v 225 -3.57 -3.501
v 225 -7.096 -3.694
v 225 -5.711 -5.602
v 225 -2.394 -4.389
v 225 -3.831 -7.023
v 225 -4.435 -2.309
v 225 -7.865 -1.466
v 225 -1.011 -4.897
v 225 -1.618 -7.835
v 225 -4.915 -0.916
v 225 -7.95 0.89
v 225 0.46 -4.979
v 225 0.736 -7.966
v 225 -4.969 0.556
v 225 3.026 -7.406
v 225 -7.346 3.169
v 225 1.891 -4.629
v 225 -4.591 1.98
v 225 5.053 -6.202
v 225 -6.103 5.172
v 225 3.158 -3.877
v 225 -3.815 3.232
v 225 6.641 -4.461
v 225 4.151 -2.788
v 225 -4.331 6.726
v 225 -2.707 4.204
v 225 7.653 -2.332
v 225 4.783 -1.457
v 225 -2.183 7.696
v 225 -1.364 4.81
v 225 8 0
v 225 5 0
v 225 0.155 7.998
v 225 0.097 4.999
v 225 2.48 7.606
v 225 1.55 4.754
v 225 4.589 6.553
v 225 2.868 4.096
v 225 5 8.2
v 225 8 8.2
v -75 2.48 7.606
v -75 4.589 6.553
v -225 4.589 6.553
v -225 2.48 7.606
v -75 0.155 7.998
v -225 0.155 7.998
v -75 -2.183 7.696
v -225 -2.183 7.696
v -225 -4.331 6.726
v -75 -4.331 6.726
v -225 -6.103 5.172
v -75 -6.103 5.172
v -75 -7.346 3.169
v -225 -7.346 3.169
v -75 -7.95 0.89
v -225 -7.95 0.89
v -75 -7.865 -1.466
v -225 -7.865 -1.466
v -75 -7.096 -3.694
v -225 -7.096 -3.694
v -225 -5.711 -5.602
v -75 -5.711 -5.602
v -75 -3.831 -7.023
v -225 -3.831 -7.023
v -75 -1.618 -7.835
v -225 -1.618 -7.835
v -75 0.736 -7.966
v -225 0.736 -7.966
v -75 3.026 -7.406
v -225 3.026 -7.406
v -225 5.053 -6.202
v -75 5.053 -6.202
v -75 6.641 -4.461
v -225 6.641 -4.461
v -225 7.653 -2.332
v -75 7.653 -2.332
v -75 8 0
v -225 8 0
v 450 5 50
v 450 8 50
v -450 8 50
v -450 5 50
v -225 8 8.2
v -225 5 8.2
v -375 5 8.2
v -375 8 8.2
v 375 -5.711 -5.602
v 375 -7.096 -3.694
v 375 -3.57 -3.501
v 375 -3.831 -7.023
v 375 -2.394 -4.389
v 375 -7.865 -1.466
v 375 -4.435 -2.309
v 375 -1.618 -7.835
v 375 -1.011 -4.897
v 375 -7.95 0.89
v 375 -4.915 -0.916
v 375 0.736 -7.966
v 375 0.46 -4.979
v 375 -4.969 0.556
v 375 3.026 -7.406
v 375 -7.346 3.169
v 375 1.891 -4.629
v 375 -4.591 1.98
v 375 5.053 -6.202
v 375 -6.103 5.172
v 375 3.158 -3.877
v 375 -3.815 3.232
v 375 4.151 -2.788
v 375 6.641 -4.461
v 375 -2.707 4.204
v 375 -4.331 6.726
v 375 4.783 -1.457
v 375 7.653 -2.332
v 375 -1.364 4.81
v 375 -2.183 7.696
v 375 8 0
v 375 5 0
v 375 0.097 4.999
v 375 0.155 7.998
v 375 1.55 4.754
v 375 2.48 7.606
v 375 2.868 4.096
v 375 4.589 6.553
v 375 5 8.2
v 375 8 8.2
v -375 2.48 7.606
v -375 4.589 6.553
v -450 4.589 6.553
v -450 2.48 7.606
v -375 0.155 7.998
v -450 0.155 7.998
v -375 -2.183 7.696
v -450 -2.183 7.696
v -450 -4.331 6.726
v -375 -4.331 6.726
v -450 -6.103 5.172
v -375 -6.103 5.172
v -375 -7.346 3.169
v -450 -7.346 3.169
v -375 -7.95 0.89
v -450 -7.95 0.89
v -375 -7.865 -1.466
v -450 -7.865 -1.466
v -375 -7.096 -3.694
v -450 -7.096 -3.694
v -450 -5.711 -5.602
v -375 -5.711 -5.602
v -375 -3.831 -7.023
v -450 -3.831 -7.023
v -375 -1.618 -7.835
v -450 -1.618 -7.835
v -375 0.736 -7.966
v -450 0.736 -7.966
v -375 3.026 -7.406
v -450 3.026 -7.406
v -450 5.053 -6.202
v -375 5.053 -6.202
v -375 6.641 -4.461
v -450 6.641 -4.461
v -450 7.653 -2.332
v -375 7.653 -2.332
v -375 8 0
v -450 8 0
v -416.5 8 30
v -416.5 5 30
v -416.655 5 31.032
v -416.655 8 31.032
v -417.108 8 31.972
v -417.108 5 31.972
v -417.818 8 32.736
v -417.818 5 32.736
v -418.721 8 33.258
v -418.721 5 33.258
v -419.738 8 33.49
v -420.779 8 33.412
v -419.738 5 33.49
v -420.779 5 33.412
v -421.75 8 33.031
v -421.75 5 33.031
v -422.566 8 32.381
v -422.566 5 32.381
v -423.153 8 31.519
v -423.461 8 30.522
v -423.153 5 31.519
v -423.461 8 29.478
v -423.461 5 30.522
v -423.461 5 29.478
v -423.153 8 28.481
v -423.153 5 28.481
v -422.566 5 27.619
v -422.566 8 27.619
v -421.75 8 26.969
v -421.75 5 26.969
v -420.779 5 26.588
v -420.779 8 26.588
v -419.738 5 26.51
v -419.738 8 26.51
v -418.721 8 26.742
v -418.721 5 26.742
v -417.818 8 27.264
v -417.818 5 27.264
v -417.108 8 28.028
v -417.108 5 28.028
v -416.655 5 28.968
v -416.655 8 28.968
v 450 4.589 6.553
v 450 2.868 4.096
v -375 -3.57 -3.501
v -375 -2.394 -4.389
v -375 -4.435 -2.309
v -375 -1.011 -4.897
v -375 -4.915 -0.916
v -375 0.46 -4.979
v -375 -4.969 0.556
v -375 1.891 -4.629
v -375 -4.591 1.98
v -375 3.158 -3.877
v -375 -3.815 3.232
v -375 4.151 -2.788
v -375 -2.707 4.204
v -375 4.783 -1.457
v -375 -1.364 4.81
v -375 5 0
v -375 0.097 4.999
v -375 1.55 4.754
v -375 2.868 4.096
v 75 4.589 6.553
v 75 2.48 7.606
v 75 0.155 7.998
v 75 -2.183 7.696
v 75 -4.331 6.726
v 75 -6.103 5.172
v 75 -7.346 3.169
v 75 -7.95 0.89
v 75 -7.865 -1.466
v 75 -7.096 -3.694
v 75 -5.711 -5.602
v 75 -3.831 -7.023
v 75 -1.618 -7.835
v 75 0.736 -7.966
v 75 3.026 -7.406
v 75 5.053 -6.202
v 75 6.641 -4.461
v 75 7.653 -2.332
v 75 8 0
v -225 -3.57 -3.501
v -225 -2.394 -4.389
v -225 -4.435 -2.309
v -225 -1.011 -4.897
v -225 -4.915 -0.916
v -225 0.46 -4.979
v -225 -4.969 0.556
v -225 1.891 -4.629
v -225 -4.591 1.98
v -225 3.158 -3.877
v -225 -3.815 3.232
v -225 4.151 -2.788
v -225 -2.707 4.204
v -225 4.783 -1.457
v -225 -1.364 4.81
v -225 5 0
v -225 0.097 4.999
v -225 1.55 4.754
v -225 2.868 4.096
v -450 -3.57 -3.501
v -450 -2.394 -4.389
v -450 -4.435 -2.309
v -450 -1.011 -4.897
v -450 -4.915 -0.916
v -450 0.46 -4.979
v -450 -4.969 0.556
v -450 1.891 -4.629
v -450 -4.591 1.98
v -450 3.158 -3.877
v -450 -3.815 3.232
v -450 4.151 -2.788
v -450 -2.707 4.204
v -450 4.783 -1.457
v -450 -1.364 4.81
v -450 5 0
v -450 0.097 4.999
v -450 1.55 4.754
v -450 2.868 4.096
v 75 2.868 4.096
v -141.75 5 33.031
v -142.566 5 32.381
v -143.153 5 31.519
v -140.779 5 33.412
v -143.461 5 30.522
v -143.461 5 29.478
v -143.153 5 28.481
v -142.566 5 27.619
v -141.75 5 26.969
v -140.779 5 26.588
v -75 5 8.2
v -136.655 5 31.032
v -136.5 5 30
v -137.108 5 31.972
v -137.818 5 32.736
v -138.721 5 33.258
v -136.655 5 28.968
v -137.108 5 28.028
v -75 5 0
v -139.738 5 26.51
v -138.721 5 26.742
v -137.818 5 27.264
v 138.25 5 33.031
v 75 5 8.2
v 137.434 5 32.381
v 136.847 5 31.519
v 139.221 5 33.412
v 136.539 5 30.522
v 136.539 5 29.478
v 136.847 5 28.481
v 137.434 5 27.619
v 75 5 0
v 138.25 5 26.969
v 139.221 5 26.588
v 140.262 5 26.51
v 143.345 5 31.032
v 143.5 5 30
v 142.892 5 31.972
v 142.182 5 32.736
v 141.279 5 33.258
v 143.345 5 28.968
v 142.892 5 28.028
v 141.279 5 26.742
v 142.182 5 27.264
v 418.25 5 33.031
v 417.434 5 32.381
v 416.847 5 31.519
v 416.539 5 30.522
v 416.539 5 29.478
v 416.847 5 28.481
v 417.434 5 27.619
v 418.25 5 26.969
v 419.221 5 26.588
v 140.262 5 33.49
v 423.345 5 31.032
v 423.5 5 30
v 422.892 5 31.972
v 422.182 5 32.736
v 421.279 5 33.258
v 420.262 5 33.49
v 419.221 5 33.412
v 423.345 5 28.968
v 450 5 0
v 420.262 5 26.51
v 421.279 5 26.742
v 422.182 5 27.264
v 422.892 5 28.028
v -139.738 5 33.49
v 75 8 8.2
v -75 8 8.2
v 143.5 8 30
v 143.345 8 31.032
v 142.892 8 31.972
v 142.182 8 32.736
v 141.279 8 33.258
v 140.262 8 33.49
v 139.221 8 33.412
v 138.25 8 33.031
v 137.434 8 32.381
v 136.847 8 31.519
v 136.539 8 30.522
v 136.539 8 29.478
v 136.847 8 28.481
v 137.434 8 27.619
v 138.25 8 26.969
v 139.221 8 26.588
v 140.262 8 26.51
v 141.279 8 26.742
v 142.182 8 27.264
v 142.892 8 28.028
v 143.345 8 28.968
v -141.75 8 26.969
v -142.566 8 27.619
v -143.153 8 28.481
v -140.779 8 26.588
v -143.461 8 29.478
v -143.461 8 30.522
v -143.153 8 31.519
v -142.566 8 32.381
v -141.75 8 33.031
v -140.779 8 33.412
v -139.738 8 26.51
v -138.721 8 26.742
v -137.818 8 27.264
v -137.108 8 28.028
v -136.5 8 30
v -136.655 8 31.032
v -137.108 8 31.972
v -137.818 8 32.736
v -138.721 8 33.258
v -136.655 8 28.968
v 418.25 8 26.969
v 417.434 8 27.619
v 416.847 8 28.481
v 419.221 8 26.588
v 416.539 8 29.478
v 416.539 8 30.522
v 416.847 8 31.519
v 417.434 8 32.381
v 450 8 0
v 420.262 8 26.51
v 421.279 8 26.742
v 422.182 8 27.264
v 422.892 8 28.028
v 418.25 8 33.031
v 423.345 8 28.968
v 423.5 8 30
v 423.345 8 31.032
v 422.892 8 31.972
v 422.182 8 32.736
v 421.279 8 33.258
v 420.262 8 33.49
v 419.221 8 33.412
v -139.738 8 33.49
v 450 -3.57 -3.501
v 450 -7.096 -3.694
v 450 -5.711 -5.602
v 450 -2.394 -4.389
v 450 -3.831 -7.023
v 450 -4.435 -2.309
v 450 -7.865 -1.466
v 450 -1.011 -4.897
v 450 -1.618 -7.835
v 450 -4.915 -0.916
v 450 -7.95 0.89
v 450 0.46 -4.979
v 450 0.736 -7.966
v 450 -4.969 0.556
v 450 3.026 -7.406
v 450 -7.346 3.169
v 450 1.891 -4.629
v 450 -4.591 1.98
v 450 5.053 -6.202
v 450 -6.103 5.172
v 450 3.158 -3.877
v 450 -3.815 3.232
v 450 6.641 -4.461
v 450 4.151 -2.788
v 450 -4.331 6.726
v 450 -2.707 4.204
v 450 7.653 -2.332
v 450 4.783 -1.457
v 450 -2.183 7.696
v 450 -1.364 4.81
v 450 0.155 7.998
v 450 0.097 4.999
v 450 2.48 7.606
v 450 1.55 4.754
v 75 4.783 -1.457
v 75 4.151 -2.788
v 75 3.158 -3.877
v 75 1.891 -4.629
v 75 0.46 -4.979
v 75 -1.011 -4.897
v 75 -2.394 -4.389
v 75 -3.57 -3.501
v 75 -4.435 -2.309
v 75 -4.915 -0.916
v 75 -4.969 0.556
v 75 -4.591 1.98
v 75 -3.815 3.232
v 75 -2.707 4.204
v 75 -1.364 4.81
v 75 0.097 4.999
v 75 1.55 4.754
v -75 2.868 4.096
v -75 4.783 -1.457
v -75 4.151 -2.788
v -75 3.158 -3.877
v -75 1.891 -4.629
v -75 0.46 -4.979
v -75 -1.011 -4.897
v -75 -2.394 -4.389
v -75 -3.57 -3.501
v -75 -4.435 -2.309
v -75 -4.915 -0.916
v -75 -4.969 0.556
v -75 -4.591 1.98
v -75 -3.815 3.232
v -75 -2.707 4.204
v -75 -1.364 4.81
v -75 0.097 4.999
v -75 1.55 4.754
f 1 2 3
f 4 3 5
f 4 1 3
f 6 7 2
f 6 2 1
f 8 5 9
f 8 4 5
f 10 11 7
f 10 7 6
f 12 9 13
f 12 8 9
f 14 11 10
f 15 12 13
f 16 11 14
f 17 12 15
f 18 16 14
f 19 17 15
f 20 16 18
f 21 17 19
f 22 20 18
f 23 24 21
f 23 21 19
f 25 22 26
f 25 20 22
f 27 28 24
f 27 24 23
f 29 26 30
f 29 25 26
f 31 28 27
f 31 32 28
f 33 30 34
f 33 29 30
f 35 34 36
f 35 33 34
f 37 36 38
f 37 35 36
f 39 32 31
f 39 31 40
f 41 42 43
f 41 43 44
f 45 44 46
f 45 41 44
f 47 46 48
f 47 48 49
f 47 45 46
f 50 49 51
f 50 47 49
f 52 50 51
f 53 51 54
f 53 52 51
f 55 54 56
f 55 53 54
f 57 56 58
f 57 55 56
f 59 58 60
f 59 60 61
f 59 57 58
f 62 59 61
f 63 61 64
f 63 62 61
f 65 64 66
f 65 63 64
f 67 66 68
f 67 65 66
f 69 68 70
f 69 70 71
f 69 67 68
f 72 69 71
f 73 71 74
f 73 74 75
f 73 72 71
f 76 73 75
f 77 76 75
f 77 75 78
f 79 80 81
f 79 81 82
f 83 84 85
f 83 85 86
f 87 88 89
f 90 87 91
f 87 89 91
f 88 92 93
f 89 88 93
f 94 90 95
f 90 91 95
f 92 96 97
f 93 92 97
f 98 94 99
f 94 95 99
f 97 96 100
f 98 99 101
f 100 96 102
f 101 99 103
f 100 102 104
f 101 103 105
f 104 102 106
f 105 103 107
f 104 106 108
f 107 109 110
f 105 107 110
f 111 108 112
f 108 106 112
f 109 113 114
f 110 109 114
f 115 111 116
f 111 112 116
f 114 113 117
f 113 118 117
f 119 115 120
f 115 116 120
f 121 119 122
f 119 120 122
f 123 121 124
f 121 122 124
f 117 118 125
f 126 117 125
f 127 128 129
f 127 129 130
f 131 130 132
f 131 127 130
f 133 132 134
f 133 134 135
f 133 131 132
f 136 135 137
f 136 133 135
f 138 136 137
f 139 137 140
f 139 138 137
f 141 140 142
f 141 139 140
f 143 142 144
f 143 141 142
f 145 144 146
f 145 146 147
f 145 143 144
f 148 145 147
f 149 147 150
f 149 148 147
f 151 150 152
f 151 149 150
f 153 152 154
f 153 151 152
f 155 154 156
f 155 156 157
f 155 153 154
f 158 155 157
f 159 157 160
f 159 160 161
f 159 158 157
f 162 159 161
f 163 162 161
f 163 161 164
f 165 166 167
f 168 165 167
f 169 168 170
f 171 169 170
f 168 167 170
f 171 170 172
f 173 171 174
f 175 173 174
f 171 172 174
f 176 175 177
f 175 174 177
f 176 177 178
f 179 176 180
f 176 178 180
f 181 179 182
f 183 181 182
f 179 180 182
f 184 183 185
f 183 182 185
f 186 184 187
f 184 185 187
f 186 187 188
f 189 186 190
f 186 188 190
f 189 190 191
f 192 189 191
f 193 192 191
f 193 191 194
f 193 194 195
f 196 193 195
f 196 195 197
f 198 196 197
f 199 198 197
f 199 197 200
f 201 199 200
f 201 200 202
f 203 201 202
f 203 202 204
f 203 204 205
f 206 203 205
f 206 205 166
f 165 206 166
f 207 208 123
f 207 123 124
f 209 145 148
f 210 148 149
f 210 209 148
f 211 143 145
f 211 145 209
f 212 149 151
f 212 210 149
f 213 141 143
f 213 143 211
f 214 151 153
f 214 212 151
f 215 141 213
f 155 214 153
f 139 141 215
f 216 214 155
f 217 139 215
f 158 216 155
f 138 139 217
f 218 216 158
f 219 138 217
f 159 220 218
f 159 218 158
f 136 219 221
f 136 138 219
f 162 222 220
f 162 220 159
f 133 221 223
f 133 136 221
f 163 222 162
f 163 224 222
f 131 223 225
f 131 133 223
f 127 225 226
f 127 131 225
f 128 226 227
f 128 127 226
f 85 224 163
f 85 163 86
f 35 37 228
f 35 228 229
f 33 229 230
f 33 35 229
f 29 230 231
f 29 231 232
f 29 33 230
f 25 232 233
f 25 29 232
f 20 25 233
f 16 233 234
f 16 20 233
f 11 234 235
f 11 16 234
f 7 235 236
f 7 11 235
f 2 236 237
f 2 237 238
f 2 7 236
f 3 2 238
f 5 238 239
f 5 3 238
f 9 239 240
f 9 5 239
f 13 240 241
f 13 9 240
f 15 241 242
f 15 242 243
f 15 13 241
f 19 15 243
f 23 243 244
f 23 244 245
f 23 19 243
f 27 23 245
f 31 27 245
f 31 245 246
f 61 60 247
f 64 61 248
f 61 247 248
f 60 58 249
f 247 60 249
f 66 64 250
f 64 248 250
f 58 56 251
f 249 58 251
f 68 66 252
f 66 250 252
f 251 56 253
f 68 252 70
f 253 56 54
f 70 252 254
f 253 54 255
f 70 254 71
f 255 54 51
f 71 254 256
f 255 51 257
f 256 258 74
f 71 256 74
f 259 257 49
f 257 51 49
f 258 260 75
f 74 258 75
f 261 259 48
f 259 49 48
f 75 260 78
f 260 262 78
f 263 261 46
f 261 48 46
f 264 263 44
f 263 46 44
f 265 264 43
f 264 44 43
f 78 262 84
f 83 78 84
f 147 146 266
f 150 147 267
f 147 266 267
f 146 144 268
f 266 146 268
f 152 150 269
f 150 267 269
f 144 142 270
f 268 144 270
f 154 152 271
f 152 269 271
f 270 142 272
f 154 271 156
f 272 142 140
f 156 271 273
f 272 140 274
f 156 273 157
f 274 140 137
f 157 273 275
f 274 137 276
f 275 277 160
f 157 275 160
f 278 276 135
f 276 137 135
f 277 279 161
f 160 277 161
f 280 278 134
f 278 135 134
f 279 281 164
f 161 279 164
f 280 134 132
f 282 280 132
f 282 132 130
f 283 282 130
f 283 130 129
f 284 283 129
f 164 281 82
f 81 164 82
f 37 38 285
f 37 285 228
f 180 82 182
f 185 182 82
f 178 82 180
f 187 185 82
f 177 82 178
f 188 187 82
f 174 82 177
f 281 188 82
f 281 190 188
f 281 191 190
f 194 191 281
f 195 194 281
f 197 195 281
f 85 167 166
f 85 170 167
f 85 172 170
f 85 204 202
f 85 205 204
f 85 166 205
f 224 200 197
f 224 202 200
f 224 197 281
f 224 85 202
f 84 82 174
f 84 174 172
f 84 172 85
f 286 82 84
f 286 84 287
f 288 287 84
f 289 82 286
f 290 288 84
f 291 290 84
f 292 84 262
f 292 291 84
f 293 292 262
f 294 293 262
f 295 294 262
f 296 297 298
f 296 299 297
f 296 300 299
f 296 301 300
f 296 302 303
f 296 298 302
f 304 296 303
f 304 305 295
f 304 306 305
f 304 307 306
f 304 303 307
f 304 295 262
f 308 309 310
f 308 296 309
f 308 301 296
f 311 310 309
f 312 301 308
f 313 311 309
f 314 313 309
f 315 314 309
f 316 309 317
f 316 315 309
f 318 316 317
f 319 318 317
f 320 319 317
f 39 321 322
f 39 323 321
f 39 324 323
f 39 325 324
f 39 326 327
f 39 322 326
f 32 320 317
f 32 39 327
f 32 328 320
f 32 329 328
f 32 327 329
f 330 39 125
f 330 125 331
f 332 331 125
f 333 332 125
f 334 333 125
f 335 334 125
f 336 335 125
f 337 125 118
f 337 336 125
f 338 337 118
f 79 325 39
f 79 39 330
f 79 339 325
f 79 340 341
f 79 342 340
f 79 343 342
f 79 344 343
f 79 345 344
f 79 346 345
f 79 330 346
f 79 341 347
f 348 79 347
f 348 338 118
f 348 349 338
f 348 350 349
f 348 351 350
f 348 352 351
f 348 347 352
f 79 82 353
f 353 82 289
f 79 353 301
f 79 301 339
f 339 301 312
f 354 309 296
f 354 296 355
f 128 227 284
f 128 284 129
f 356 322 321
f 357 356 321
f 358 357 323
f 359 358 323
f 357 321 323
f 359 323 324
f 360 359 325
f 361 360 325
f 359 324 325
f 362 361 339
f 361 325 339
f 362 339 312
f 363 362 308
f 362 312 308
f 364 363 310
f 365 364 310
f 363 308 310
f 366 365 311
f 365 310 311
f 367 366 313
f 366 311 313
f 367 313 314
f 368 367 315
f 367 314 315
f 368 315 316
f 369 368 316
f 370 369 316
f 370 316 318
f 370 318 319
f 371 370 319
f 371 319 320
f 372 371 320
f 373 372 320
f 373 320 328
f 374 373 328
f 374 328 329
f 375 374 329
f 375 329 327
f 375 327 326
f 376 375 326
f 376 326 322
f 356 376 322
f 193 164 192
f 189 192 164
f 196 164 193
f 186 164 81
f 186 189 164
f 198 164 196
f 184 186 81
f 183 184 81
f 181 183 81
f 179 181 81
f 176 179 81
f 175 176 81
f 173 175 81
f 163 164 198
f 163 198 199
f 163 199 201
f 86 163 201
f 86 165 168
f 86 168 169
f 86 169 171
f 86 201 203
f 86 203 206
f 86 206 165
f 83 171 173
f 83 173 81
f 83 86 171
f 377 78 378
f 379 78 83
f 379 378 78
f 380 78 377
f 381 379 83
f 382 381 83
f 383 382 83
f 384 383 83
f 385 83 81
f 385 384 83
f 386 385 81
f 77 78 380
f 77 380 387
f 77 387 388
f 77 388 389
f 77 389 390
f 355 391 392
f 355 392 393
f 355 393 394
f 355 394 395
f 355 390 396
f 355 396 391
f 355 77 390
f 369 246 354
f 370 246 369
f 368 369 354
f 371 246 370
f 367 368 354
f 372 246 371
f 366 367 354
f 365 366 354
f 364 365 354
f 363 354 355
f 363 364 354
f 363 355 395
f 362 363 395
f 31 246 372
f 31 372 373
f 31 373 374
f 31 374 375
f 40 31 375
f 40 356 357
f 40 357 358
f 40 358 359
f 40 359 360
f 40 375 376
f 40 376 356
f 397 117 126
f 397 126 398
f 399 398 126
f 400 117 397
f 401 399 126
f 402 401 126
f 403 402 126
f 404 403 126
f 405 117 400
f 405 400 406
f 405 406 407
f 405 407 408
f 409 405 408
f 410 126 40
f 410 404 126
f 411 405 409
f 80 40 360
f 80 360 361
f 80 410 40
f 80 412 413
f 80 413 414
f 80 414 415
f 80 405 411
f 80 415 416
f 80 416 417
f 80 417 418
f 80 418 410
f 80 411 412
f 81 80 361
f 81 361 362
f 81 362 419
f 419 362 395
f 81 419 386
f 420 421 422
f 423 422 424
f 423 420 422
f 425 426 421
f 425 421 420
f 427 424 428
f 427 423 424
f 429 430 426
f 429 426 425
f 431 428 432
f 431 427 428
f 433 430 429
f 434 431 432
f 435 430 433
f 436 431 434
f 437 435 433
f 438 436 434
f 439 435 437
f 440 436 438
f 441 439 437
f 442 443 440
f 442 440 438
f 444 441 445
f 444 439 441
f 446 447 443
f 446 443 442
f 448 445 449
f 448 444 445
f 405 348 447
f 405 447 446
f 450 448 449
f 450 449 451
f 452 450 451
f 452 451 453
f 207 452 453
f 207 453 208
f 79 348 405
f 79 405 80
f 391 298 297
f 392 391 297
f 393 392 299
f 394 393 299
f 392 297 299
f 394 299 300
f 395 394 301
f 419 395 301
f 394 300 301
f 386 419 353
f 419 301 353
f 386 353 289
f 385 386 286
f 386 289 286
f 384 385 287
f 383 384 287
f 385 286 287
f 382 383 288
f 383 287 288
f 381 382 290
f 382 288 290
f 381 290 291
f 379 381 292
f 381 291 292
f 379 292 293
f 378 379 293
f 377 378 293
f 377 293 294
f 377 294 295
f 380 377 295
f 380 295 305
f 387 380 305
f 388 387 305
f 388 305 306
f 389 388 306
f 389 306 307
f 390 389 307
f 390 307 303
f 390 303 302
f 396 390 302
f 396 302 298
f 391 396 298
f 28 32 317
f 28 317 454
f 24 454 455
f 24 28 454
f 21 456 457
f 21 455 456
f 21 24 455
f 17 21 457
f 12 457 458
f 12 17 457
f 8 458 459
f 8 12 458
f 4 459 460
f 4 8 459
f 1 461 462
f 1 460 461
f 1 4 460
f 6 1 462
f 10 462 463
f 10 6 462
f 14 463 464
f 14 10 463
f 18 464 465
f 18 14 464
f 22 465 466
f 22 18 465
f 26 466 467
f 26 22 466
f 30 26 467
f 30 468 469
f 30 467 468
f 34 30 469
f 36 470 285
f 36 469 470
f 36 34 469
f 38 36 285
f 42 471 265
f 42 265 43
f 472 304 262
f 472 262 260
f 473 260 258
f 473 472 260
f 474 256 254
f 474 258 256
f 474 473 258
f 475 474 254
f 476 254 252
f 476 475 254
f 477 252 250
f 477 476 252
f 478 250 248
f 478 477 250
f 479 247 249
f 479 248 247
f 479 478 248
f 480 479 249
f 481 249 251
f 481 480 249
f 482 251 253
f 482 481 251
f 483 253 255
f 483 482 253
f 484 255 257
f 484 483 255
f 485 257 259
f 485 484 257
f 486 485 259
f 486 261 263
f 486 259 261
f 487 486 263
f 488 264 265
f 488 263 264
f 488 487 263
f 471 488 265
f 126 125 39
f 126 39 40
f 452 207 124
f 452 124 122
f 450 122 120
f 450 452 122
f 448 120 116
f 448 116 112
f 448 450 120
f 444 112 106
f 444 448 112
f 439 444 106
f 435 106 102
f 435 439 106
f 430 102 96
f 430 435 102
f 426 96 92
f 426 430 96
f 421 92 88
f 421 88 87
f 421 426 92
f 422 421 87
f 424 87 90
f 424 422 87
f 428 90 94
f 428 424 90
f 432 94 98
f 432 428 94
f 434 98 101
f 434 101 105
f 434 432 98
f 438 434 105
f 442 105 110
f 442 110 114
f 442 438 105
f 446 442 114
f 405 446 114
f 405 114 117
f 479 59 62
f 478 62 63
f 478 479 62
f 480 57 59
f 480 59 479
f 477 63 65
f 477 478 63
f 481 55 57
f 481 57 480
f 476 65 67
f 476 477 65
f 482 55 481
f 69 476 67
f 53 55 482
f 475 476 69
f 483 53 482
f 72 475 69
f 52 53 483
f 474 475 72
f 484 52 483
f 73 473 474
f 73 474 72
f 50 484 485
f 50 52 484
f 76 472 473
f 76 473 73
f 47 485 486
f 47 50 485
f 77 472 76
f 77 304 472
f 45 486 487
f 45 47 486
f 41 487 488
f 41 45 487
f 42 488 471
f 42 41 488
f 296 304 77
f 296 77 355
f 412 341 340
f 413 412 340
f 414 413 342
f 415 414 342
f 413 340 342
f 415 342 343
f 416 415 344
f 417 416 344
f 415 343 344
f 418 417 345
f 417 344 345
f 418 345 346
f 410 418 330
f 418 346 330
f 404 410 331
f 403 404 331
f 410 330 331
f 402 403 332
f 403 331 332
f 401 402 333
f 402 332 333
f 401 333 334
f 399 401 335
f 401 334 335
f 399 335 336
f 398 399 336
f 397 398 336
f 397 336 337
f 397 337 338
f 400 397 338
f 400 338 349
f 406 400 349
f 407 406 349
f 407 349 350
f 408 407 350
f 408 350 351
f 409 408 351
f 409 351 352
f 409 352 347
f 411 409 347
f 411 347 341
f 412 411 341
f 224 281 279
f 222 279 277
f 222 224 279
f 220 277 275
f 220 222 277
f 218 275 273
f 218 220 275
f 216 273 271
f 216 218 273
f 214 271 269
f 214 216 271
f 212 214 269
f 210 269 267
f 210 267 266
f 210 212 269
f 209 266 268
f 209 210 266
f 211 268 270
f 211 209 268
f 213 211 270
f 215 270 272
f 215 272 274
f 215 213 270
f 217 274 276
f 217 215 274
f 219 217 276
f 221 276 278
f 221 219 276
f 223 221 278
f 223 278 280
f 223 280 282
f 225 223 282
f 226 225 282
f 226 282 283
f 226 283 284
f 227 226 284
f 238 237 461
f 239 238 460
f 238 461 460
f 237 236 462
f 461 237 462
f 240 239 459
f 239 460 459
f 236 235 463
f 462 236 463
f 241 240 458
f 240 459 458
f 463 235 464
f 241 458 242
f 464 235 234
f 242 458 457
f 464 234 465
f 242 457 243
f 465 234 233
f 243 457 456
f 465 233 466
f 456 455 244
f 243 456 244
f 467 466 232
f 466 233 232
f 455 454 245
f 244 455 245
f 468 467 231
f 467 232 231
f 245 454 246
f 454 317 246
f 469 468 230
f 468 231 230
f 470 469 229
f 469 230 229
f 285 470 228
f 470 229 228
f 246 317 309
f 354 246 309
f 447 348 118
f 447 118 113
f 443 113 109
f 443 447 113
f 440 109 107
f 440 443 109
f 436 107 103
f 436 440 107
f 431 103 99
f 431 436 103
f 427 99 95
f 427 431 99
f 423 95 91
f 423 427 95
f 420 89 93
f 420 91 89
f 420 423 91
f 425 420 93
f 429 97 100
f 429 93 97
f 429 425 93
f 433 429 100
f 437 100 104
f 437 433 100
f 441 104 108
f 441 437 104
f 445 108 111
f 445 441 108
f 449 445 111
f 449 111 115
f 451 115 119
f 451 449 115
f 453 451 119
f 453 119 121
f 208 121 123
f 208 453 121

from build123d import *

# Parameters (mm, degrees)
F1_DEPTH  = 450
F9_W      = 16.4
F9_H      = 16.4
F10_DEPTH = 150
F11_W     = 16.4
F11_H     = 16.4
F12_DEPTH = 150
F13_W     = 16.4
F13_H     = 16.4
F14_DEPTH = 150
F15_R     = 3.5
F16_DEPTH = 8.001


with BuildPart() as f1:
    # F0 (on Right) → F1 (new body, symmetric)
    with BuildSketch(Plane.YZ):
        with BuildLine():
            Line((2.867882, 4.09576), (4.588611, 6.553216))
            ThreePointArc((4.588611, 6.553216), (-7.096087, -3.693989), (8, 0))
            Line((8, 0), (8, 50))
            Line((8, 50), (5, 50))
            Line((5, 50), (5, 0))
            ThreePointArc((5, 0), (-4.435054, -2.308743), (2.867882, 4.09576))
        make_face()
    extrude(amount=F1_DEPTH, both=True)

    # F9 (on offset) → F10 (cut)
    with BuildSketch(Plane.YZ.offset(375)):
        Rectangle(F9_W, F9_H)
    extrude(amount=-F10_DEPTH, mode=Mode.SUBTRACT)

    # F11 (on offset) → F12 (cut)
    with BuildSketch(Plane.YZ.offset(75)):
        Rectangle(F11_W, F11_H)
    extrude(amount=-F12_DEPTH, mode=Mode.SUBTRACT)

    # F13 (on offset) → F14 (cut)
    with BuildSketch(Plane.YZ.offset(-225)):
        Rectangle(F13_W, F13_H)
    extrude(amount=-F14_DEPTH, mode=Mode.SUBTRACT)

    # F15 (on Front) → F16 (cut, through all)
    with BuildSketch(Plane.XZ):
        with Locations((140, 30)):
            Circle(F15_R)
        with Locations((-140, 30)):
            Circle(F15_R)
        with Locations((-420, 30)):
            Circle(F15_R)
        with Locations((420, 30)):
            Circle(F15_R)
    extrude(amount=-F16_DEPTH, mode=Mode.SUBTRACT)


solid = f1.part
